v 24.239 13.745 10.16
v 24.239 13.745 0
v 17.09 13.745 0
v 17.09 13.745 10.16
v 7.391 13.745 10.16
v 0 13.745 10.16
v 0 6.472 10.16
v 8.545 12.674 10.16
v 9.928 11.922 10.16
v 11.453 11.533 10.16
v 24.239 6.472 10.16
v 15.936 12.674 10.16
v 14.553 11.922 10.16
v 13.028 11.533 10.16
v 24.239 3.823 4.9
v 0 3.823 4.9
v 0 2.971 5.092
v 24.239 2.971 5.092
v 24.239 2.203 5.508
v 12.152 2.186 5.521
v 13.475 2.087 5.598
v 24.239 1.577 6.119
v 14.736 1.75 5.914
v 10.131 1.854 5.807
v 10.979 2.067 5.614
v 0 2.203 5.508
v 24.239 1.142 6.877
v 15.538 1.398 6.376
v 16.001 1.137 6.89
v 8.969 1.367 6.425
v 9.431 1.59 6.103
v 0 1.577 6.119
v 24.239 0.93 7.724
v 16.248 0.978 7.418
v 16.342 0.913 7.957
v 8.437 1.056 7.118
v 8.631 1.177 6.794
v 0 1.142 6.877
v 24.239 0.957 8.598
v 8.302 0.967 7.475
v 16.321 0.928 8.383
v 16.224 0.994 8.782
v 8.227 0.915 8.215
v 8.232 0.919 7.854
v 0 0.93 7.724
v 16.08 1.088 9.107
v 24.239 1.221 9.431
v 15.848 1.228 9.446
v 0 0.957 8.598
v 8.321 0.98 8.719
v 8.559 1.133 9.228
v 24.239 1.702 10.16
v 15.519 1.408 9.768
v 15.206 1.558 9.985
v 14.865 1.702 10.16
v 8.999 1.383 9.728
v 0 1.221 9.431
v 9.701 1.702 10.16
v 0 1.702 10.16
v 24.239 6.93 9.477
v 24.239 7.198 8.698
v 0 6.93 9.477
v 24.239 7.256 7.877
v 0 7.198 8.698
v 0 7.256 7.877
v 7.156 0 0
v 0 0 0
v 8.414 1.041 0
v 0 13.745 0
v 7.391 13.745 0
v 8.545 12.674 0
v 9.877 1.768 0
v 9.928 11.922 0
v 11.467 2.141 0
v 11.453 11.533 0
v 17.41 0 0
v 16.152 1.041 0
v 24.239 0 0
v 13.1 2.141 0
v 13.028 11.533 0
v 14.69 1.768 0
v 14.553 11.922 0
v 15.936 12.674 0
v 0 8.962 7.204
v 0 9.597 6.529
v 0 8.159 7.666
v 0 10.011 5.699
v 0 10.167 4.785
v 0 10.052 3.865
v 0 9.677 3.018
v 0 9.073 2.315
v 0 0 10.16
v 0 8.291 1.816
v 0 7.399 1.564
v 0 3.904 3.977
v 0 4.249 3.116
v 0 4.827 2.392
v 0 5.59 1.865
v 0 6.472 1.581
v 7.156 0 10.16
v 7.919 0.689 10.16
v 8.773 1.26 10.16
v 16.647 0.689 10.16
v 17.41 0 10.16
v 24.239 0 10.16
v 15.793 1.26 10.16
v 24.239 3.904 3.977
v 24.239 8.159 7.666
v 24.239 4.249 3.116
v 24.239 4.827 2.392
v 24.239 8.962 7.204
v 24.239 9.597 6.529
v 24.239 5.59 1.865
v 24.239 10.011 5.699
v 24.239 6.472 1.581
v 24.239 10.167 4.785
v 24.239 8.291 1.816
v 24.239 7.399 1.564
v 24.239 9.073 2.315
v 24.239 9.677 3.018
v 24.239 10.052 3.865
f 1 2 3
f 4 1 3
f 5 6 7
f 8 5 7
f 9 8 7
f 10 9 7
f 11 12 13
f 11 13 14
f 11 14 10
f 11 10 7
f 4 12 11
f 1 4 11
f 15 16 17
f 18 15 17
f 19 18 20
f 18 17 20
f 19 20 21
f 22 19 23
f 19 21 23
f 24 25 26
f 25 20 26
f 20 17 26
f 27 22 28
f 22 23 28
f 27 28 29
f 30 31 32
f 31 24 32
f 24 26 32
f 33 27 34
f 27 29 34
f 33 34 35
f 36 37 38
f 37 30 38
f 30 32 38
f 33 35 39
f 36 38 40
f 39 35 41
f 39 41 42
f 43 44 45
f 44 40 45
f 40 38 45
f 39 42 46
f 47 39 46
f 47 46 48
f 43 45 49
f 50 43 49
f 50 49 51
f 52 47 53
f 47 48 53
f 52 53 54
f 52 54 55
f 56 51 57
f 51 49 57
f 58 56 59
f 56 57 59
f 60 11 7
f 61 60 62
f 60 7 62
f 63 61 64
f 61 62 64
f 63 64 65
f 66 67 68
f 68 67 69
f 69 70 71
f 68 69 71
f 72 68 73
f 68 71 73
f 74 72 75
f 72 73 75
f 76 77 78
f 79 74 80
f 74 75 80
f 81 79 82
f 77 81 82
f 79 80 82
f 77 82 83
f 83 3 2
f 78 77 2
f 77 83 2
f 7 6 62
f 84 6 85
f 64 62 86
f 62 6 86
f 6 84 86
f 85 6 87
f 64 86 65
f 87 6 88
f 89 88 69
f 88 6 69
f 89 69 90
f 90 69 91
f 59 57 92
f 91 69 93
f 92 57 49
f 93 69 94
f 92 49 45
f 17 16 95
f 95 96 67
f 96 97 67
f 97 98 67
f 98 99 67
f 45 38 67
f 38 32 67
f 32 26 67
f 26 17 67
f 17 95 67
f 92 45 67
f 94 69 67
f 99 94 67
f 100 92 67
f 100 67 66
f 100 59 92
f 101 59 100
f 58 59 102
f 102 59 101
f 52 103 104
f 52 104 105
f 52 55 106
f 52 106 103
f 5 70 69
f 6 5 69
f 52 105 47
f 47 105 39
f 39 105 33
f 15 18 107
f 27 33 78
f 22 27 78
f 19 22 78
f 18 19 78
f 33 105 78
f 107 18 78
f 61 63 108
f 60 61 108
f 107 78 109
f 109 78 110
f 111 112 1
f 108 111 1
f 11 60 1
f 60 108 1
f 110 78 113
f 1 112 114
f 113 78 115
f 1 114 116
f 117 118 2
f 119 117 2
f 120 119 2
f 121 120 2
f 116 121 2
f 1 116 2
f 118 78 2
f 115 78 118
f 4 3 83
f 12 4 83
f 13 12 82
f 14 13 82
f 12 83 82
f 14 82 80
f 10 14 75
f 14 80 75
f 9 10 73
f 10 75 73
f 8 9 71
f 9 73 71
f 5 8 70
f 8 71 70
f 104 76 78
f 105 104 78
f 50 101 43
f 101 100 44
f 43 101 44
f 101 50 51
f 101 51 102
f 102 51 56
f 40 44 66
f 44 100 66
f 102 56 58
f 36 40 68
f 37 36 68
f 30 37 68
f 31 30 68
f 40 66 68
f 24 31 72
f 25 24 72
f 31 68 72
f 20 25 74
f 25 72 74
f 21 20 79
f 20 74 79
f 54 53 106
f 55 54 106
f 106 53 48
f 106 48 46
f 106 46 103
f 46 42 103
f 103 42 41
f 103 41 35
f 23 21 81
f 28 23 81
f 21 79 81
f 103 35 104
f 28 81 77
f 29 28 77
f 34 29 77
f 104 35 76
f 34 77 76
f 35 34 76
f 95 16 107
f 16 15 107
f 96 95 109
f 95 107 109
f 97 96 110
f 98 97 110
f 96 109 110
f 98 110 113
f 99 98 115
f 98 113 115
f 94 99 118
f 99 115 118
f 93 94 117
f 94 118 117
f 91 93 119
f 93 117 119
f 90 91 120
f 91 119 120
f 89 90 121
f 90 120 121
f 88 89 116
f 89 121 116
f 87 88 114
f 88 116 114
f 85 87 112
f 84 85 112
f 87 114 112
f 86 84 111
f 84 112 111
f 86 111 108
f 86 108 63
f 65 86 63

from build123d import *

# Parameters (mm, degrees)
F1_DEPTH   = 10.16
F4_D       = 6.35
F4_ON_F2_D = 6.35


with BuildPart() as f1:
    # F0 (on Top) → F1 (new body)
    with BuildSketch(Plane.XY):
        with BuildLine():
            Line((0, 13.7451505288), (0, 0))
            Line((0, 0), (7.1561528284, 0))
            ThreePointArc((7.1561528284, 0), (12.2831791104, 2.1876687498), (17.4102053924, 0))
            Line((17.4102053924, 0), (24.2389943451, 0))
            Line((24.2389943451, 0), (24.2389943451, 13.7451505288))
            Line((24.2389943451, 13.7451505288), (17.0903896092, 13.7451505288))
            ThreePointArc((17.0903896092, 13.7451505288), (12.240587268, 11.4840131173), (7.3907849269, 13.7451505288))
            Line((7.3907849269, 13.7451505288), (0, 13.7451505288))
        make_face()
    extrude(amount=F1_DEPTH)

    # F4 (through all)
    with Locations(Plane.YZ.offset(24.2389943451)):
        with Locations((4.0866504423, 8.0641144887)):
            Hole(F4_D / 2)

    # F4 on F2 (through all)
    with Locations(Plane(origin=(0, 0, 0), x_dir=(0, -1, 0), z_dir=(-1, 0, 0))):
        with Locations((-6.9927107543, 4.7133392654)):
            Hole(F4_ON_F2_D / 2)


solid = f1.part
